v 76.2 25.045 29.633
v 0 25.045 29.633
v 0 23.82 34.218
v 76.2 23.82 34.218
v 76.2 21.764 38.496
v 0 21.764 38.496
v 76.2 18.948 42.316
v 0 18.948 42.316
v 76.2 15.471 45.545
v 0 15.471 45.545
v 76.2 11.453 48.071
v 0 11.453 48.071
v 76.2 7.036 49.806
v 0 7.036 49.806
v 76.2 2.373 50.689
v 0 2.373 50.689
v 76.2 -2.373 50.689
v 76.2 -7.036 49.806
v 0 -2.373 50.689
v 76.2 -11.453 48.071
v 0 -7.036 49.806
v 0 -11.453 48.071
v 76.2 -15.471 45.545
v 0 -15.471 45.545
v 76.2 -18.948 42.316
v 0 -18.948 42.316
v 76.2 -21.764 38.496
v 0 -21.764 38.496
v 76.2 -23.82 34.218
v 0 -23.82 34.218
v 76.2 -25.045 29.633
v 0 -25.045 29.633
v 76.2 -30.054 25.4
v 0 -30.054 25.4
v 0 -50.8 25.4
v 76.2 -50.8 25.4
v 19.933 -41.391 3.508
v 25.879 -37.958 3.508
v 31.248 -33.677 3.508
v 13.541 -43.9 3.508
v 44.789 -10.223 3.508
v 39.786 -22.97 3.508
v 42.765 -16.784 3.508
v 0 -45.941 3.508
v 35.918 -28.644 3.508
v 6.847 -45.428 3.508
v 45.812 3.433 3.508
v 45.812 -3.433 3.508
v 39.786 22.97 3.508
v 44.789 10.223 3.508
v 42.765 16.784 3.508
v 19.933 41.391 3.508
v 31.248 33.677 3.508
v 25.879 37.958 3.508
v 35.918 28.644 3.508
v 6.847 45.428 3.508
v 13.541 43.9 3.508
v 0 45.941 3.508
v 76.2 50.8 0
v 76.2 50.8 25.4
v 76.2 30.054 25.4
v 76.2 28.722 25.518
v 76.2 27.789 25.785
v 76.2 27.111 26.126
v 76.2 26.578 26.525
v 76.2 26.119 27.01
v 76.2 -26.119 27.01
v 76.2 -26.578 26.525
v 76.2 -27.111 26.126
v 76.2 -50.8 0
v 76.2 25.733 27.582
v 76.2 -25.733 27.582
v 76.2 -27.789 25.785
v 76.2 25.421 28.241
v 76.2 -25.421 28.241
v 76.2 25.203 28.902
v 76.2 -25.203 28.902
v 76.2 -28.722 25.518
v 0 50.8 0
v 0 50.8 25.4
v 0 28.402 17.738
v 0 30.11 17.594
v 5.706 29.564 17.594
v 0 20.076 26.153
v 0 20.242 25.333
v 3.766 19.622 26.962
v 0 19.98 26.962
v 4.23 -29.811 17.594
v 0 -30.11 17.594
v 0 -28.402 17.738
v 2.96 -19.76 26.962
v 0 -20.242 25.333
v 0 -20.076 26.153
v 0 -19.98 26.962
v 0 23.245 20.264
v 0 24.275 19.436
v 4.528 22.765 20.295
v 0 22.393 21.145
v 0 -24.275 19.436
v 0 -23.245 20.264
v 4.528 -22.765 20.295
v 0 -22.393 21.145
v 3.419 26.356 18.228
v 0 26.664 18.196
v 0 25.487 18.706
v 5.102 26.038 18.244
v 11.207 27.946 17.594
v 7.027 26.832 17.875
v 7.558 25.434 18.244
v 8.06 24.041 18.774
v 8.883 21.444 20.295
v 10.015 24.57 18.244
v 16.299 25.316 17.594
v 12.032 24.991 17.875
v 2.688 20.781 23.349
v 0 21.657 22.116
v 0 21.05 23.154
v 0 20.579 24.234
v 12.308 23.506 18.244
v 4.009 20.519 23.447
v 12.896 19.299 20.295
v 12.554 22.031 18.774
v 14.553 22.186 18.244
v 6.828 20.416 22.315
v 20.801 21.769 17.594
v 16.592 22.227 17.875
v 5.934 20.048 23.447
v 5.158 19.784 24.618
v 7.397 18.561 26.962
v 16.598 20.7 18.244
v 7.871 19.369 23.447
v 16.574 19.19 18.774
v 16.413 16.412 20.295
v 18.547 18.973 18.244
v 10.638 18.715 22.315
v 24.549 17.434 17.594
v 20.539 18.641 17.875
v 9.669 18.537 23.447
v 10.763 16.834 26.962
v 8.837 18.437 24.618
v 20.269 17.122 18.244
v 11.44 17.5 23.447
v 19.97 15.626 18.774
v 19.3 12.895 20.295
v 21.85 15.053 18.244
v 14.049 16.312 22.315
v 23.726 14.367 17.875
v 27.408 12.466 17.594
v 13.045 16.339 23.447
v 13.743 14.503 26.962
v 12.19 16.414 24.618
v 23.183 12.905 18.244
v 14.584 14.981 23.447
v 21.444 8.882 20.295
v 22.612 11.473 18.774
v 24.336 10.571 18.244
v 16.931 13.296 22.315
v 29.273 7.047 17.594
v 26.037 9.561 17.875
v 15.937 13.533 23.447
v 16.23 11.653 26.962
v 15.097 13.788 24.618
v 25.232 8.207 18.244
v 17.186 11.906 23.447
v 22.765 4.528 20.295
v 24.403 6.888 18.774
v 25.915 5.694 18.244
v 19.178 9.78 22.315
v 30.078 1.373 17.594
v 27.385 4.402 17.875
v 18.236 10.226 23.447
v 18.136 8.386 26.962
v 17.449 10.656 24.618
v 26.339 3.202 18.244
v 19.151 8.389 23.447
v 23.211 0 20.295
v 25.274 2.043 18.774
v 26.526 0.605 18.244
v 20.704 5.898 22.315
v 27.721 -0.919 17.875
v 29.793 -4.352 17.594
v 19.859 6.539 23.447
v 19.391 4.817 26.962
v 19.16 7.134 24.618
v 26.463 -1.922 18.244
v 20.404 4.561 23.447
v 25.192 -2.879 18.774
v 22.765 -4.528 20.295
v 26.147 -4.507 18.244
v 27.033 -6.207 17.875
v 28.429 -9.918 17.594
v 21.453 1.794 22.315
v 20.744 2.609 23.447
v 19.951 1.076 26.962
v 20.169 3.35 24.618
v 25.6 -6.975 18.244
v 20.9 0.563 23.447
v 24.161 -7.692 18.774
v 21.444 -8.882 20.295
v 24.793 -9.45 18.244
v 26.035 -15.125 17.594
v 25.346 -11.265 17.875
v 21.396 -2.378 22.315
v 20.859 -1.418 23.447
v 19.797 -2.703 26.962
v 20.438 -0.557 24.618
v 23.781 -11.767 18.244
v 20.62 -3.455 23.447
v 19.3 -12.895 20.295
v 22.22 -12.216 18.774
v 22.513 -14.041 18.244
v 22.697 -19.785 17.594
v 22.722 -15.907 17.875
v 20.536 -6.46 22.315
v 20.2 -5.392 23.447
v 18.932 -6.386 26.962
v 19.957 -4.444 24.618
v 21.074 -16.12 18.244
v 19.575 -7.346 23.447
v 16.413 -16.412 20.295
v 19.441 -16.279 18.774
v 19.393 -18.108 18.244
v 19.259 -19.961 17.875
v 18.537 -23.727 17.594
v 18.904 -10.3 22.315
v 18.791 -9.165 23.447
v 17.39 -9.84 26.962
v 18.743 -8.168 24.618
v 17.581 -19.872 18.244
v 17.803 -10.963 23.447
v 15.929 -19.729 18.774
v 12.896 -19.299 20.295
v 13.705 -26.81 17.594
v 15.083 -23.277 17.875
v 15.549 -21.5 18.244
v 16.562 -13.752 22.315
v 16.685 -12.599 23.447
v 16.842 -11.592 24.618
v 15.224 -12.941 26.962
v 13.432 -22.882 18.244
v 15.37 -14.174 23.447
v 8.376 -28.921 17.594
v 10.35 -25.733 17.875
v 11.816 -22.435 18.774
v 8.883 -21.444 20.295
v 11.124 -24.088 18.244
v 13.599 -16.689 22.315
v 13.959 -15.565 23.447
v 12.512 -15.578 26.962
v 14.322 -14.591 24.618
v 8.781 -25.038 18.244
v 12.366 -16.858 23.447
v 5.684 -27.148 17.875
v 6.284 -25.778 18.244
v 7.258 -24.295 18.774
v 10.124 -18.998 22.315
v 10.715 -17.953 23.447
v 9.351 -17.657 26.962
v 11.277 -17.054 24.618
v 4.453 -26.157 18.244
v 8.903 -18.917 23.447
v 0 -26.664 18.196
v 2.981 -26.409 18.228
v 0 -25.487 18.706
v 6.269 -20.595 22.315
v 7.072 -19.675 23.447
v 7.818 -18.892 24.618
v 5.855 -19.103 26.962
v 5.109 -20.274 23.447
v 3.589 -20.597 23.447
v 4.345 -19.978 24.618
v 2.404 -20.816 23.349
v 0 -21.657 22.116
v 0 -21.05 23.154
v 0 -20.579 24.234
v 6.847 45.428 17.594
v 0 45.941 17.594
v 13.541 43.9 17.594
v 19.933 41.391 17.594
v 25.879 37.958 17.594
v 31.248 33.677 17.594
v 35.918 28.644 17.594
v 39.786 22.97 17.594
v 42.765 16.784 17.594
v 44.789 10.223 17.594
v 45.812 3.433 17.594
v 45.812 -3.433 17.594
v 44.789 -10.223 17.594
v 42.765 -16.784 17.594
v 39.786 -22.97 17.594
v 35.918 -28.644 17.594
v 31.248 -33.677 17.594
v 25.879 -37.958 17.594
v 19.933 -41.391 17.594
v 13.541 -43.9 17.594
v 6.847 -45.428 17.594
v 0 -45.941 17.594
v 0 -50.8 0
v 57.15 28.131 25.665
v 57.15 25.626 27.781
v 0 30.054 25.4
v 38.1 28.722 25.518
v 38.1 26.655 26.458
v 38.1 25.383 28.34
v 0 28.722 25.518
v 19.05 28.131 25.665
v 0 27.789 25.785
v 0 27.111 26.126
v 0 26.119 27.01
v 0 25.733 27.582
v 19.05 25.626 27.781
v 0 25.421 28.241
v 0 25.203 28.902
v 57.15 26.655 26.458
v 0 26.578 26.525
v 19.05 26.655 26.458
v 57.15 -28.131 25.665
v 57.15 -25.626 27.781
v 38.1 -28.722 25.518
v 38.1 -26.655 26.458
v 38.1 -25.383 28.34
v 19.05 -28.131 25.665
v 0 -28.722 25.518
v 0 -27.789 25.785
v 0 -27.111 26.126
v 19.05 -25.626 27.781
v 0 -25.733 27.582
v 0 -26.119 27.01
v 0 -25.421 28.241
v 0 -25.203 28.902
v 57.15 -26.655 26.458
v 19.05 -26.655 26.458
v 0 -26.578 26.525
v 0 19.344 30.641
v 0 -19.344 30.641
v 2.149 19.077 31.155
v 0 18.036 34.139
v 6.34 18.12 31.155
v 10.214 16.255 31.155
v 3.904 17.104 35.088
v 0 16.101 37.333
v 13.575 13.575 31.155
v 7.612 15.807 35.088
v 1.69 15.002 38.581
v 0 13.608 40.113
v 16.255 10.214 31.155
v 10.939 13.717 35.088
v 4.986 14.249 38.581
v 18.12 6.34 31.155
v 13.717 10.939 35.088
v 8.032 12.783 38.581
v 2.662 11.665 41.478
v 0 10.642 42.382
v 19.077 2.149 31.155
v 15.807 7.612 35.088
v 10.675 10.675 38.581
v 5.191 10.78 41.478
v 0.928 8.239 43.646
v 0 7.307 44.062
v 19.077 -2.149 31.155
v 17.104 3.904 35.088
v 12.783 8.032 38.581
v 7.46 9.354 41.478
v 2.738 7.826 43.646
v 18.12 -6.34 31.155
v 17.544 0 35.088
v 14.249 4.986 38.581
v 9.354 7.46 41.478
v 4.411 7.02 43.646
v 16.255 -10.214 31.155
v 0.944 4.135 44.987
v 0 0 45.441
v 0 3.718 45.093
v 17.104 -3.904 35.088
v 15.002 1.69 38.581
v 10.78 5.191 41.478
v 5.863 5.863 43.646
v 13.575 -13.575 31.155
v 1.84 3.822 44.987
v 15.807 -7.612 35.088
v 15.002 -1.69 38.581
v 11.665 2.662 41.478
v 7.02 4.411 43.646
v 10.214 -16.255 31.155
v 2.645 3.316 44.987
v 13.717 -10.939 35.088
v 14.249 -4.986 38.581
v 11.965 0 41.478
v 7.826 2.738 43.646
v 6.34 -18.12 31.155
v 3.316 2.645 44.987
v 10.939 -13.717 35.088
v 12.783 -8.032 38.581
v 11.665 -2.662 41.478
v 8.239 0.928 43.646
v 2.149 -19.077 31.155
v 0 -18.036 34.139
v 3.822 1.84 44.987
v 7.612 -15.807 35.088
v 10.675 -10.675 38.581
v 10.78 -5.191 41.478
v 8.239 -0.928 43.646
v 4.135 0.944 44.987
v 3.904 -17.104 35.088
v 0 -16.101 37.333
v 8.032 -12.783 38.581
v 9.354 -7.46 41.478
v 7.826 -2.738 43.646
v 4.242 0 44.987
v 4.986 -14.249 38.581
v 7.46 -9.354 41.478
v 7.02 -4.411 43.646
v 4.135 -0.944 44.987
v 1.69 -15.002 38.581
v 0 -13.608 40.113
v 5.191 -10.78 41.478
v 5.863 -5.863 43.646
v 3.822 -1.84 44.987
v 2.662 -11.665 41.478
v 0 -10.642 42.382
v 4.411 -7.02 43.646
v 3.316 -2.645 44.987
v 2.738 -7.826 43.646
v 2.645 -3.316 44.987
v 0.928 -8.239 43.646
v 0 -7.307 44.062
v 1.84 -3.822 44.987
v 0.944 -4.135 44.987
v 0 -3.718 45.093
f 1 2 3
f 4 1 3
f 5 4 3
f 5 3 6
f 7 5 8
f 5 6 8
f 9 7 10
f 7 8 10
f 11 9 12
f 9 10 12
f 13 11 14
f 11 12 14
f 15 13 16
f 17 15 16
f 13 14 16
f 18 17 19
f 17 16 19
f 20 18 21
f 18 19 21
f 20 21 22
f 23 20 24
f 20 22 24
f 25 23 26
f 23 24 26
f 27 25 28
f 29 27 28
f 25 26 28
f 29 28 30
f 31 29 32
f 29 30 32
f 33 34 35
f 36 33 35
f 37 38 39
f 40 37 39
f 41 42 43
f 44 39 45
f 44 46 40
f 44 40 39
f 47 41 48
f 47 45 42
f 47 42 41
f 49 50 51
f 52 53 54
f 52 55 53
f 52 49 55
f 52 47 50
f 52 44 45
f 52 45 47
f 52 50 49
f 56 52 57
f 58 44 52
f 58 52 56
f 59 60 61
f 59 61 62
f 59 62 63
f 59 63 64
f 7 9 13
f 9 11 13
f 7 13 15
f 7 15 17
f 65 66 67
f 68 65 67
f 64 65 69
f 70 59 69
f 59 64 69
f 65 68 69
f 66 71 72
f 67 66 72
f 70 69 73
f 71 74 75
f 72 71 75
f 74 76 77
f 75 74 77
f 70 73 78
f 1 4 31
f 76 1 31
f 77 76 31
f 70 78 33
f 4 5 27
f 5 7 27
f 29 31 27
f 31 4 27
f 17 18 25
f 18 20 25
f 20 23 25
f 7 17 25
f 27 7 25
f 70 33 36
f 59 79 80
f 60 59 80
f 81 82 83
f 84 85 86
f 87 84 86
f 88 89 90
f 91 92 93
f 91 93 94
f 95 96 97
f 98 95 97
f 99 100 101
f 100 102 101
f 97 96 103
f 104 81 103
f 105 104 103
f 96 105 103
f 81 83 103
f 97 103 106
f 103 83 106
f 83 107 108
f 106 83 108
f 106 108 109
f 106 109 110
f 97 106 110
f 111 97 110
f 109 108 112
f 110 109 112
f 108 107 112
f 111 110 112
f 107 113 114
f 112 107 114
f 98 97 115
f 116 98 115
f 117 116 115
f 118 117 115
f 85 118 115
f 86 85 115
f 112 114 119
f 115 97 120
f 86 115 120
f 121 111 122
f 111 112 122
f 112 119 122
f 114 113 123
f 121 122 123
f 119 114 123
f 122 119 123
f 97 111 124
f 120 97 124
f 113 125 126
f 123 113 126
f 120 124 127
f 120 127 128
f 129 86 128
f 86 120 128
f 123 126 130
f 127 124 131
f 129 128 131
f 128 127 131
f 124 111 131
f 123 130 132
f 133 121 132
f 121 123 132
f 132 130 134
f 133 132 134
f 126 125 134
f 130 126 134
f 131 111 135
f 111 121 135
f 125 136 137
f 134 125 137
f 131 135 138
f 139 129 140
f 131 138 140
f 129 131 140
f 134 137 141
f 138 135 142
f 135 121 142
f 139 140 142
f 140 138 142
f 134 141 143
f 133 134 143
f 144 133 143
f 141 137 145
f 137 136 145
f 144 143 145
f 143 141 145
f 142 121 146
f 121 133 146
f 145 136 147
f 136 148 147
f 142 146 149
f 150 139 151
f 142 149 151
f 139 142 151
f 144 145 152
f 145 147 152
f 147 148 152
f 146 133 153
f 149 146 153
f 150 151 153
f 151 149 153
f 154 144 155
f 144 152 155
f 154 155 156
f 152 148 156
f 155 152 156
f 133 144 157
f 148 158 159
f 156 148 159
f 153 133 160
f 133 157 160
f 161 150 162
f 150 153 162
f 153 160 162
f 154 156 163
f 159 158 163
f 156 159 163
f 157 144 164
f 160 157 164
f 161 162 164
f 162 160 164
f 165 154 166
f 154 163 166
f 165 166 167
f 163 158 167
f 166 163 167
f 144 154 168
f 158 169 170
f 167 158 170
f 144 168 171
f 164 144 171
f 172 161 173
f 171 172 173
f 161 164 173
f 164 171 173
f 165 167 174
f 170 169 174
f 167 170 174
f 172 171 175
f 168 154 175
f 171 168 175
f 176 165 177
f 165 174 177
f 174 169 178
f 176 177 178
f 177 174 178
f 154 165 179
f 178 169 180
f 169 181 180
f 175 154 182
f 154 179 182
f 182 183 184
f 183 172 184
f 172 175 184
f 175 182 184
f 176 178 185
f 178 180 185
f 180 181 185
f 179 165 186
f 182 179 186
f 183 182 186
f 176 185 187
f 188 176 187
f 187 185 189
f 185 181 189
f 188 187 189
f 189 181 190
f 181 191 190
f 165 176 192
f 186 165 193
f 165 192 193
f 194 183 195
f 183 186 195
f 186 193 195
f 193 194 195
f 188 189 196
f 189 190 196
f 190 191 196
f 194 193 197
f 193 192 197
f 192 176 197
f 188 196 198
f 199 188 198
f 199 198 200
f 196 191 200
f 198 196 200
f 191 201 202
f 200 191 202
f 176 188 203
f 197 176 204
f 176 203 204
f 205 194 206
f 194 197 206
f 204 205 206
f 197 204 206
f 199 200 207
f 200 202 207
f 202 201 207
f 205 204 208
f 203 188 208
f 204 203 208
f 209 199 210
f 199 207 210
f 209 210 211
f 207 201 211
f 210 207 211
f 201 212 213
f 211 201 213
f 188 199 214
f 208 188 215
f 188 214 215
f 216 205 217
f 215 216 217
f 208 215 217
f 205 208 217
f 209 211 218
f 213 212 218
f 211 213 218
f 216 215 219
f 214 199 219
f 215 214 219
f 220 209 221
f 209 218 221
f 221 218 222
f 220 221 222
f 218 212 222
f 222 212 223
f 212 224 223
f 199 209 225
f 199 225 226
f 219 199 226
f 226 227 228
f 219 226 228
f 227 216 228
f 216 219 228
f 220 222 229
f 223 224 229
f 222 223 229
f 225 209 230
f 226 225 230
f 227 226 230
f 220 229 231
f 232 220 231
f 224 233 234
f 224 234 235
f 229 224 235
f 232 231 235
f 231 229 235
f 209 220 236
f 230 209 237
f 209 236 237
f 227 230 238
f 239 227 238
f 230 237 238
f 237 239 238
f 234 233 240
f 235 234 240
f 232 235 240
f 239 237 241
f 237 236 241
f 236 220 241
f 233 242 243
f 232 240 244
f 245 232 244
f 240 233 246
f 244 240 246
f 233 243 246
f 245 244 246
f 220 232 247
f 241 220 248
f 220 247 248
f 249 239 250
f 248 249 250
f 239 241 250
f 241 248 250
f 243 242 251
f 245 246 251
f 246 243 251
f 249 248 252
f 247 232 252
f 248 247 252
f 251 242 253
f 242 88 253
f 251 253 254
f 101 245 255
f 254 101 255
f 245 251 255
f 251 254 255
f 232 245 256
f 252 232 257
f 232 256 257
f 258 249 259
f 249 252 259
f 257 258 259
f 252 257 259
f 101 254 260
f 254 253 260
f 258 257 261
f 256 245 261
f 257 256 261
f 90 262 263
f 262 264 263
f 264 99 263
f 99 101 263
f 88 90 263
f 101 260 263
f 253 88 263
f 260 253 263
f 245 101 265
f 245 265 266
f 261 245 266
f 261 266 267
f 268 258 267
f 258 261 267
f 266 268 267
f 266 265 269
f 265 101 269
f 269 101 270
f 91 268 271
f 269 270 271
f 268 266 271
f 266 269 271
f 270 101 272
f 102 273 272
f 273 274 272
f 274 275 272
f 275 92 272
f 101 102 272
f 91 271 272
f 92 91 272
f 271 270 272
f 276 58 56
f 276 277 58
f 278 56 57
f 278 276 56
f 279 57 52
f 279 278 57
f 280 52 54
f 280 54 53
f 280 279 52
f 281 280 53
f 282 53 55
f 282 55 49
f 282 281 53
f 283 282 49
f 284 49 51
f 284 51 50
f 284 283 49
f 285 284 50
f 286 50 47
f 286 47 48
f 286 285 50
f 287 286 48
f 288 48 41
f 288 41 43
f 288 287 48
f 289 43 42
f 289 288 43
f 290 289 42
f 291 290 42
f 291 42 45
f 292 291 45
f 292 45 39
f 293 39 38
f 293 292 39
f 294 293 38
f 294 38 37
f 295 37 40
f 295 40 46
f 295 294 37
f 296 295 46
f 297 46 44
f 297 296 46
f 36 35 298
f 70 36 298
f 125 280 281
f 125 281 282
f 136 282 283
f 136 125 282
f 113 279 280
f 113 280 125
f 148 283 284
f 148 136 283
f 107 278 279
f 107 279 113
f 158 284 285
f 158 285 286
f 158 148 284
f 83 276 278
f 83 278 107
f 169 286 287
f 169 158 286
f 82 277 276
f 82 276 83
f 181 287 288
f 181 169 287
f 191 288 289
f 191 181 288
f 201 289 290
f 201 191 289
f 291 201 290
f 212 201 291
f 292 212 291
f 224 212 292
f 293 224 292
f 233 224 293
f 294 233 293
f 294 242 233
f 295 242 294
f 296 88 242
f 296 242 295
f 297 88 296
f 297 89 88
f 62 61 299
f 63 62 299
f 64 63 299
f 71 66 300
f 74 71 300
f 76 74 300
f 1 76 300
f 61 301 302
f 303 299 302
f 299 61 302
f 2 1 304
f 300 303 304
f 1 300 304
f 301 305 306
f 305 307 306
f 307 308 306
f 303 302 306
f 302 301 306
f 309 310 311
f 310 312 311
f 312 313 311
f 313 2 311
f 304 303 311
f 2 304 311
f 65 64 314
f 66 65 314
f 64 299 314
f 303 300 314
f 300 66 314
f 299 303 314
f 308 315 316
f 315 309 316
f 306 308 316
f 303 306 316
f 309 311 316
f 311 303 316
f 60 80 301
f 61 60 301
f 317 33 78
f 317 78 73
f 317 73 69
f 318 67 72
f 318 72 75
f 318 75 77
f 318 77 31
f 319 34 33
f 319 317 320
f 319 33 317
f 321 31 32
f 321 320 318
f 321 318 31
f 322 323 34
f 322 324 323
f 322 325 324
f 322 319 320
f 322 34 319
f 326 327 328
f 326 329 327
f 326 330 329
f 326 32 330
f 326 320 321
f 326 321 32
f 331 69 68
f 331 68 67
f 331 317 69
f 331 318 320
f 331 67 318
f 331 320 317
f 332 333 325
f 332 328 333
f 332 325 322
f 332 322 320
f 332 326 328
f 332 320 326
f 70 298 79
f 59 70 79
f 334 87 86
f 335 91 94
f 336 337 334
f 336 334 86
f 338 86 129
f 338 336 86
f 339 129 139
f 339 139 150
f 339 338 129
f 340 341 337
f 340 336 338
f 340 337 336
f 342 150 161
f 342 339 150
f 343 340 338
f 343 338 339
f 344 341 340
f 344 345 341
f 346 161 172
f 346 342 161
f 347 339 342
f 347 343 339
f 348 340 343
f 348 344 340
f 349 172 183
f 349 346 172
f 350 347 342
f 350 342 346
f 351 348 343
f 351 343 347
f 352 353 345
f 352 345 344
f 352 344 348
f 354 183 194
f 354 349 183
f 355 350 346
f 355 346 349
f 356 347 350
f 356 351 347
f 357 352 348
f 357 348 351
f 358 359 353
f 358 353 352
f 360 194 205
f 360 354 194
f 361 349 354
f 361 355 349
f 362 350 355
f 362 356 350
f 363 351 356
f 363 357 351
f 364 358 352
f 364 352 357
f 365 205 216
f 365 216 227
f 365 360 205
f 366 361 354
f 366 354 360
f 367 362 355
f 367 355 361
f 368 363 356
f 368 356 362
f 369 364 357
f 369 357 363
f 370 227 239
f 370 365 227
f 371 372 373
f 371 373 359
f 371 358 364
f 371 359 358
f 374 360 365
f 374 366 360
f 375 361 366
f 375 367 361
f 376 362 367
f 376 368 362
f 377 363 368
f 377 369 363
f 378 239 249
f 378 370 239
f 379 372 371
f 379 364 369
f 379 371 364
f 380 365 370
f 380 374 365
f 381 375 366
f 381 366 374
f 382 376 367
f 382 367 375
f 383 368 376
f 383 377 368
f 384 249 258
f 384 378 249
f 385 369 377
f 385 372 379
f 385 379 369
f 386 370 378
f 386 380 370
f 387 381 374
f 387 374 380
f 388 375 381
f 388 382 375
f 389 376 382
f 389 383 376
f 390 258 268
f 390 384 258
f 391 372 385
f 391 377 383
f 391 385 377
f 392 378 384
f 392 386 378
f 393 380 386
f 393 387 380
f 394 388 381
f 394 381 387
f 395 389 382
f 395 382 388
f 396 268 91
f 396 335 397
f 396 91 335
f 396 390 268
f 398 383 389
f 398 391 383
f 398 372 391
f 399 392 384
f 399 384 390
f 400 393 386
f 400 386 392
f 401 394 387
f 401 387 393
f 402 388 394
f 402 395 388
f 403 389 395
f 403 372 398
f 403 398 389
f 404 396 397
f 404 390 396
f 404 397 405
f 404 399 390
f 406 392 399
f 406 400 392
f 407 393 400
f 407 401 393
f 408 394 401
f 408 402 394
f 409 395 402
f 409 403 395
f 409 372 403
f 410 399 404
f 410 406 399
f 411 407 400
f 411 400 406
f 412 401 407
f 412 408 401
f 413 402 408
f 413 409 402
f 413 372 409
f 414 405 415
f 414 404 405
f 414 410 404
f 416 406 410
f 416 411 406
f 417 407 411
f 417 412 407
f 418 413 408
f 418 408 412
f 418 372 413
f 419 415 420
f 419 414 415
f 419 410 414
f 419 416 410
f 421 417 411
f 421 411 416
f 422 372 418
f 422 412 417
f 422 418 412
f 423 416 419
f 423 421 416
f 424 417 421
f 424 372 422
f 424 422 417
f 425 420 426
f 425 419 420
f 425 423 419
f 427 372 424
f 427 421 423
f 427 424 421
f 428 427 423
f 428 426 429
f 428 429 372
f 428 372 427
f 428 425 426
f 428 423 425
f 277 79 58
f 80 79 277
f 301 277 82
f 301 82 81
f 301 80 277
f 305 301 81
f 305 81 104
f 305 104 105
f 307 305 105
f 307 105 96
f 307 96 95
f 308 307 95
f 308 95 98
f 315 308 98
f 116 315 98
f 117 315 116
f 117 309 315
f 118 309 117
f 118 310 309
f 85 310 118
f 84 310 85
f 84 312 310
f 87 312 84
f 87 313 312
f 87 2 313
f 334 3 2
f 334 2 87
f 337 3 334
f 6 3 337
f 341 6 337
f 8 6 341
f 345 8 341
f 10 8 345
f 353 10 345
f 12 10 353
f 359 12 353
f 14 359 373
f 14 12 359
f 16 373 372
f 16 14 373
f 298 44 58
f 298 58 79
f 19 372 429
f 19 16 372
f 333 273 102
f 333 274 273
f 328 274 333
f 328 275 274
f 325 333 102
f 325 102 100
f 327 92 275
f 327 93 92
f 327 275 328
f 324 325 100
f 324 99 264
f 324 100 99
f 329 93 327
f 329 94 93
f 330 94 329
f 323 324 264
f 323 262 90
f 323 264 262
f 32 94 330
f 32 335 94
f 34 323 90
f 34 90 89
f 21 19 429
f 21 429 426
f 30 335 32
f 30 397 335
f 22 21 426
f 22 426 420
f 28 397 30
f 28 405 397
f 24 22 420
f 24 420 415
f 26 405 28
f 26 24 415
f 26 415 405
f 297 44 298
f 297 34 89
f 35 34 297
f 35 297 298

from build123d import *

# Parameters (mm, degrees)
F1_DEPTH    = 76.2
F2_T1_DEPTH = 76.2
F5_R        = 10.16


# Not quite as in the source:
# - a fillet or chamfer that OpenCascade refuses, or shapes differently, is made with other operations: its cross-section is extruded or revolved along the edge and cut away or added


with BuildPart() as f1:
    # F0 (on Right) → F1 (new body)
    with BuildSketch(Plane.YZ):
        with BuildLine():
            Line((-50.8, 0), (0, 0))
            Line((0, 0), (50.8, 0))
            Line((50.8, 0), (50.8, 25.4))
            Line((50.8, 25.4), (25.4, 25.4))
            ThreePointArc((25.4, 25.4), (0, 50.8), (-25.4, 25.4))
            Line((-25.4, 25.4), (-50.8, 25.4))
            Line((-50.8, 25.4), (-50.8, 0))
        make_face()
    extrude(amount=F1_DEPTH)

    # F2: fillet of radius 5.08 on 2 edges, made by hand

    # F2_s2 → F2_t1 (join)
    with BuildSketch(Plane.YZ):
        with BuildLine():
            add(Edge.make_bspline(
                [(-30.0536852981, 25.4), (-25.7603016841, 25.4), (-25.0447377485, 29.6333333333)],
                knots=[0, 0, 0, 1, 1, 1], degree=2, weights=[1, 1, 1]))
            ThreePointArc((-25.0447377485, 29.6333333333), (-25.3110286122, 27.5241070111), (-25.4, 25.4))
            Line((-25.4, 25.4), (-30.0536852981, 25.4))
        make_face()
        with BuildLine():
            add(Edge.make_bspline(
                [(30.0536852981, 25.4), (25.7603016841, 25.4), (25.0447377485, 29.6333333333)],
                knots=[0, 0, 0, 1, 1, 1], degree=2, weights=[1, 1, 1]))
            ThreePointArc((25.0447377485, 29.6333333333), (25.3110286122, 27.5241070111), (25.4, 25.4))
            Line((25.4, 25.4), (30.0536852981, 25.4))
        make_face()
    extrude(amount=F2_T1_DEPTH)

    # F3 (on face) → F4 (revolve, cut)
    with BuildSketch(Plane(origin=(0, 0, 0), x_dir=(0, -1, 0), z_dir=(-1, 0, 0))):
        with BuildLine():
            Line((0, 45.441377908), (0, 3.5084052943))
            Line((0, 3.5084052943), (45.9408350289, 3.5084052943))
            Line((45.9408350289, 3.5084052943), (45.9408350289, 17.5937116146))
            Line((45.9408350289, 17.5937116146), (18.4585668484, 17.5937116146))
            ThreePointArc((18.4585668484, 17.5937116146), (16.7048736009, 36.4726702484), (0, 45.441377908))
        make_face()
    revolve(axis=Axis((0, 0, 24.4748916011), (0, 0, -1)), mode=Mode.SUBTRACT)

    # F5
    f5_edges = [f1.edges().sort_by_distance(p)[0] for p in [
        (18.458567, 0, 17.593712),
    ]]
    fillet(f5_edges, radius=F5_R)


solid = f1.part
